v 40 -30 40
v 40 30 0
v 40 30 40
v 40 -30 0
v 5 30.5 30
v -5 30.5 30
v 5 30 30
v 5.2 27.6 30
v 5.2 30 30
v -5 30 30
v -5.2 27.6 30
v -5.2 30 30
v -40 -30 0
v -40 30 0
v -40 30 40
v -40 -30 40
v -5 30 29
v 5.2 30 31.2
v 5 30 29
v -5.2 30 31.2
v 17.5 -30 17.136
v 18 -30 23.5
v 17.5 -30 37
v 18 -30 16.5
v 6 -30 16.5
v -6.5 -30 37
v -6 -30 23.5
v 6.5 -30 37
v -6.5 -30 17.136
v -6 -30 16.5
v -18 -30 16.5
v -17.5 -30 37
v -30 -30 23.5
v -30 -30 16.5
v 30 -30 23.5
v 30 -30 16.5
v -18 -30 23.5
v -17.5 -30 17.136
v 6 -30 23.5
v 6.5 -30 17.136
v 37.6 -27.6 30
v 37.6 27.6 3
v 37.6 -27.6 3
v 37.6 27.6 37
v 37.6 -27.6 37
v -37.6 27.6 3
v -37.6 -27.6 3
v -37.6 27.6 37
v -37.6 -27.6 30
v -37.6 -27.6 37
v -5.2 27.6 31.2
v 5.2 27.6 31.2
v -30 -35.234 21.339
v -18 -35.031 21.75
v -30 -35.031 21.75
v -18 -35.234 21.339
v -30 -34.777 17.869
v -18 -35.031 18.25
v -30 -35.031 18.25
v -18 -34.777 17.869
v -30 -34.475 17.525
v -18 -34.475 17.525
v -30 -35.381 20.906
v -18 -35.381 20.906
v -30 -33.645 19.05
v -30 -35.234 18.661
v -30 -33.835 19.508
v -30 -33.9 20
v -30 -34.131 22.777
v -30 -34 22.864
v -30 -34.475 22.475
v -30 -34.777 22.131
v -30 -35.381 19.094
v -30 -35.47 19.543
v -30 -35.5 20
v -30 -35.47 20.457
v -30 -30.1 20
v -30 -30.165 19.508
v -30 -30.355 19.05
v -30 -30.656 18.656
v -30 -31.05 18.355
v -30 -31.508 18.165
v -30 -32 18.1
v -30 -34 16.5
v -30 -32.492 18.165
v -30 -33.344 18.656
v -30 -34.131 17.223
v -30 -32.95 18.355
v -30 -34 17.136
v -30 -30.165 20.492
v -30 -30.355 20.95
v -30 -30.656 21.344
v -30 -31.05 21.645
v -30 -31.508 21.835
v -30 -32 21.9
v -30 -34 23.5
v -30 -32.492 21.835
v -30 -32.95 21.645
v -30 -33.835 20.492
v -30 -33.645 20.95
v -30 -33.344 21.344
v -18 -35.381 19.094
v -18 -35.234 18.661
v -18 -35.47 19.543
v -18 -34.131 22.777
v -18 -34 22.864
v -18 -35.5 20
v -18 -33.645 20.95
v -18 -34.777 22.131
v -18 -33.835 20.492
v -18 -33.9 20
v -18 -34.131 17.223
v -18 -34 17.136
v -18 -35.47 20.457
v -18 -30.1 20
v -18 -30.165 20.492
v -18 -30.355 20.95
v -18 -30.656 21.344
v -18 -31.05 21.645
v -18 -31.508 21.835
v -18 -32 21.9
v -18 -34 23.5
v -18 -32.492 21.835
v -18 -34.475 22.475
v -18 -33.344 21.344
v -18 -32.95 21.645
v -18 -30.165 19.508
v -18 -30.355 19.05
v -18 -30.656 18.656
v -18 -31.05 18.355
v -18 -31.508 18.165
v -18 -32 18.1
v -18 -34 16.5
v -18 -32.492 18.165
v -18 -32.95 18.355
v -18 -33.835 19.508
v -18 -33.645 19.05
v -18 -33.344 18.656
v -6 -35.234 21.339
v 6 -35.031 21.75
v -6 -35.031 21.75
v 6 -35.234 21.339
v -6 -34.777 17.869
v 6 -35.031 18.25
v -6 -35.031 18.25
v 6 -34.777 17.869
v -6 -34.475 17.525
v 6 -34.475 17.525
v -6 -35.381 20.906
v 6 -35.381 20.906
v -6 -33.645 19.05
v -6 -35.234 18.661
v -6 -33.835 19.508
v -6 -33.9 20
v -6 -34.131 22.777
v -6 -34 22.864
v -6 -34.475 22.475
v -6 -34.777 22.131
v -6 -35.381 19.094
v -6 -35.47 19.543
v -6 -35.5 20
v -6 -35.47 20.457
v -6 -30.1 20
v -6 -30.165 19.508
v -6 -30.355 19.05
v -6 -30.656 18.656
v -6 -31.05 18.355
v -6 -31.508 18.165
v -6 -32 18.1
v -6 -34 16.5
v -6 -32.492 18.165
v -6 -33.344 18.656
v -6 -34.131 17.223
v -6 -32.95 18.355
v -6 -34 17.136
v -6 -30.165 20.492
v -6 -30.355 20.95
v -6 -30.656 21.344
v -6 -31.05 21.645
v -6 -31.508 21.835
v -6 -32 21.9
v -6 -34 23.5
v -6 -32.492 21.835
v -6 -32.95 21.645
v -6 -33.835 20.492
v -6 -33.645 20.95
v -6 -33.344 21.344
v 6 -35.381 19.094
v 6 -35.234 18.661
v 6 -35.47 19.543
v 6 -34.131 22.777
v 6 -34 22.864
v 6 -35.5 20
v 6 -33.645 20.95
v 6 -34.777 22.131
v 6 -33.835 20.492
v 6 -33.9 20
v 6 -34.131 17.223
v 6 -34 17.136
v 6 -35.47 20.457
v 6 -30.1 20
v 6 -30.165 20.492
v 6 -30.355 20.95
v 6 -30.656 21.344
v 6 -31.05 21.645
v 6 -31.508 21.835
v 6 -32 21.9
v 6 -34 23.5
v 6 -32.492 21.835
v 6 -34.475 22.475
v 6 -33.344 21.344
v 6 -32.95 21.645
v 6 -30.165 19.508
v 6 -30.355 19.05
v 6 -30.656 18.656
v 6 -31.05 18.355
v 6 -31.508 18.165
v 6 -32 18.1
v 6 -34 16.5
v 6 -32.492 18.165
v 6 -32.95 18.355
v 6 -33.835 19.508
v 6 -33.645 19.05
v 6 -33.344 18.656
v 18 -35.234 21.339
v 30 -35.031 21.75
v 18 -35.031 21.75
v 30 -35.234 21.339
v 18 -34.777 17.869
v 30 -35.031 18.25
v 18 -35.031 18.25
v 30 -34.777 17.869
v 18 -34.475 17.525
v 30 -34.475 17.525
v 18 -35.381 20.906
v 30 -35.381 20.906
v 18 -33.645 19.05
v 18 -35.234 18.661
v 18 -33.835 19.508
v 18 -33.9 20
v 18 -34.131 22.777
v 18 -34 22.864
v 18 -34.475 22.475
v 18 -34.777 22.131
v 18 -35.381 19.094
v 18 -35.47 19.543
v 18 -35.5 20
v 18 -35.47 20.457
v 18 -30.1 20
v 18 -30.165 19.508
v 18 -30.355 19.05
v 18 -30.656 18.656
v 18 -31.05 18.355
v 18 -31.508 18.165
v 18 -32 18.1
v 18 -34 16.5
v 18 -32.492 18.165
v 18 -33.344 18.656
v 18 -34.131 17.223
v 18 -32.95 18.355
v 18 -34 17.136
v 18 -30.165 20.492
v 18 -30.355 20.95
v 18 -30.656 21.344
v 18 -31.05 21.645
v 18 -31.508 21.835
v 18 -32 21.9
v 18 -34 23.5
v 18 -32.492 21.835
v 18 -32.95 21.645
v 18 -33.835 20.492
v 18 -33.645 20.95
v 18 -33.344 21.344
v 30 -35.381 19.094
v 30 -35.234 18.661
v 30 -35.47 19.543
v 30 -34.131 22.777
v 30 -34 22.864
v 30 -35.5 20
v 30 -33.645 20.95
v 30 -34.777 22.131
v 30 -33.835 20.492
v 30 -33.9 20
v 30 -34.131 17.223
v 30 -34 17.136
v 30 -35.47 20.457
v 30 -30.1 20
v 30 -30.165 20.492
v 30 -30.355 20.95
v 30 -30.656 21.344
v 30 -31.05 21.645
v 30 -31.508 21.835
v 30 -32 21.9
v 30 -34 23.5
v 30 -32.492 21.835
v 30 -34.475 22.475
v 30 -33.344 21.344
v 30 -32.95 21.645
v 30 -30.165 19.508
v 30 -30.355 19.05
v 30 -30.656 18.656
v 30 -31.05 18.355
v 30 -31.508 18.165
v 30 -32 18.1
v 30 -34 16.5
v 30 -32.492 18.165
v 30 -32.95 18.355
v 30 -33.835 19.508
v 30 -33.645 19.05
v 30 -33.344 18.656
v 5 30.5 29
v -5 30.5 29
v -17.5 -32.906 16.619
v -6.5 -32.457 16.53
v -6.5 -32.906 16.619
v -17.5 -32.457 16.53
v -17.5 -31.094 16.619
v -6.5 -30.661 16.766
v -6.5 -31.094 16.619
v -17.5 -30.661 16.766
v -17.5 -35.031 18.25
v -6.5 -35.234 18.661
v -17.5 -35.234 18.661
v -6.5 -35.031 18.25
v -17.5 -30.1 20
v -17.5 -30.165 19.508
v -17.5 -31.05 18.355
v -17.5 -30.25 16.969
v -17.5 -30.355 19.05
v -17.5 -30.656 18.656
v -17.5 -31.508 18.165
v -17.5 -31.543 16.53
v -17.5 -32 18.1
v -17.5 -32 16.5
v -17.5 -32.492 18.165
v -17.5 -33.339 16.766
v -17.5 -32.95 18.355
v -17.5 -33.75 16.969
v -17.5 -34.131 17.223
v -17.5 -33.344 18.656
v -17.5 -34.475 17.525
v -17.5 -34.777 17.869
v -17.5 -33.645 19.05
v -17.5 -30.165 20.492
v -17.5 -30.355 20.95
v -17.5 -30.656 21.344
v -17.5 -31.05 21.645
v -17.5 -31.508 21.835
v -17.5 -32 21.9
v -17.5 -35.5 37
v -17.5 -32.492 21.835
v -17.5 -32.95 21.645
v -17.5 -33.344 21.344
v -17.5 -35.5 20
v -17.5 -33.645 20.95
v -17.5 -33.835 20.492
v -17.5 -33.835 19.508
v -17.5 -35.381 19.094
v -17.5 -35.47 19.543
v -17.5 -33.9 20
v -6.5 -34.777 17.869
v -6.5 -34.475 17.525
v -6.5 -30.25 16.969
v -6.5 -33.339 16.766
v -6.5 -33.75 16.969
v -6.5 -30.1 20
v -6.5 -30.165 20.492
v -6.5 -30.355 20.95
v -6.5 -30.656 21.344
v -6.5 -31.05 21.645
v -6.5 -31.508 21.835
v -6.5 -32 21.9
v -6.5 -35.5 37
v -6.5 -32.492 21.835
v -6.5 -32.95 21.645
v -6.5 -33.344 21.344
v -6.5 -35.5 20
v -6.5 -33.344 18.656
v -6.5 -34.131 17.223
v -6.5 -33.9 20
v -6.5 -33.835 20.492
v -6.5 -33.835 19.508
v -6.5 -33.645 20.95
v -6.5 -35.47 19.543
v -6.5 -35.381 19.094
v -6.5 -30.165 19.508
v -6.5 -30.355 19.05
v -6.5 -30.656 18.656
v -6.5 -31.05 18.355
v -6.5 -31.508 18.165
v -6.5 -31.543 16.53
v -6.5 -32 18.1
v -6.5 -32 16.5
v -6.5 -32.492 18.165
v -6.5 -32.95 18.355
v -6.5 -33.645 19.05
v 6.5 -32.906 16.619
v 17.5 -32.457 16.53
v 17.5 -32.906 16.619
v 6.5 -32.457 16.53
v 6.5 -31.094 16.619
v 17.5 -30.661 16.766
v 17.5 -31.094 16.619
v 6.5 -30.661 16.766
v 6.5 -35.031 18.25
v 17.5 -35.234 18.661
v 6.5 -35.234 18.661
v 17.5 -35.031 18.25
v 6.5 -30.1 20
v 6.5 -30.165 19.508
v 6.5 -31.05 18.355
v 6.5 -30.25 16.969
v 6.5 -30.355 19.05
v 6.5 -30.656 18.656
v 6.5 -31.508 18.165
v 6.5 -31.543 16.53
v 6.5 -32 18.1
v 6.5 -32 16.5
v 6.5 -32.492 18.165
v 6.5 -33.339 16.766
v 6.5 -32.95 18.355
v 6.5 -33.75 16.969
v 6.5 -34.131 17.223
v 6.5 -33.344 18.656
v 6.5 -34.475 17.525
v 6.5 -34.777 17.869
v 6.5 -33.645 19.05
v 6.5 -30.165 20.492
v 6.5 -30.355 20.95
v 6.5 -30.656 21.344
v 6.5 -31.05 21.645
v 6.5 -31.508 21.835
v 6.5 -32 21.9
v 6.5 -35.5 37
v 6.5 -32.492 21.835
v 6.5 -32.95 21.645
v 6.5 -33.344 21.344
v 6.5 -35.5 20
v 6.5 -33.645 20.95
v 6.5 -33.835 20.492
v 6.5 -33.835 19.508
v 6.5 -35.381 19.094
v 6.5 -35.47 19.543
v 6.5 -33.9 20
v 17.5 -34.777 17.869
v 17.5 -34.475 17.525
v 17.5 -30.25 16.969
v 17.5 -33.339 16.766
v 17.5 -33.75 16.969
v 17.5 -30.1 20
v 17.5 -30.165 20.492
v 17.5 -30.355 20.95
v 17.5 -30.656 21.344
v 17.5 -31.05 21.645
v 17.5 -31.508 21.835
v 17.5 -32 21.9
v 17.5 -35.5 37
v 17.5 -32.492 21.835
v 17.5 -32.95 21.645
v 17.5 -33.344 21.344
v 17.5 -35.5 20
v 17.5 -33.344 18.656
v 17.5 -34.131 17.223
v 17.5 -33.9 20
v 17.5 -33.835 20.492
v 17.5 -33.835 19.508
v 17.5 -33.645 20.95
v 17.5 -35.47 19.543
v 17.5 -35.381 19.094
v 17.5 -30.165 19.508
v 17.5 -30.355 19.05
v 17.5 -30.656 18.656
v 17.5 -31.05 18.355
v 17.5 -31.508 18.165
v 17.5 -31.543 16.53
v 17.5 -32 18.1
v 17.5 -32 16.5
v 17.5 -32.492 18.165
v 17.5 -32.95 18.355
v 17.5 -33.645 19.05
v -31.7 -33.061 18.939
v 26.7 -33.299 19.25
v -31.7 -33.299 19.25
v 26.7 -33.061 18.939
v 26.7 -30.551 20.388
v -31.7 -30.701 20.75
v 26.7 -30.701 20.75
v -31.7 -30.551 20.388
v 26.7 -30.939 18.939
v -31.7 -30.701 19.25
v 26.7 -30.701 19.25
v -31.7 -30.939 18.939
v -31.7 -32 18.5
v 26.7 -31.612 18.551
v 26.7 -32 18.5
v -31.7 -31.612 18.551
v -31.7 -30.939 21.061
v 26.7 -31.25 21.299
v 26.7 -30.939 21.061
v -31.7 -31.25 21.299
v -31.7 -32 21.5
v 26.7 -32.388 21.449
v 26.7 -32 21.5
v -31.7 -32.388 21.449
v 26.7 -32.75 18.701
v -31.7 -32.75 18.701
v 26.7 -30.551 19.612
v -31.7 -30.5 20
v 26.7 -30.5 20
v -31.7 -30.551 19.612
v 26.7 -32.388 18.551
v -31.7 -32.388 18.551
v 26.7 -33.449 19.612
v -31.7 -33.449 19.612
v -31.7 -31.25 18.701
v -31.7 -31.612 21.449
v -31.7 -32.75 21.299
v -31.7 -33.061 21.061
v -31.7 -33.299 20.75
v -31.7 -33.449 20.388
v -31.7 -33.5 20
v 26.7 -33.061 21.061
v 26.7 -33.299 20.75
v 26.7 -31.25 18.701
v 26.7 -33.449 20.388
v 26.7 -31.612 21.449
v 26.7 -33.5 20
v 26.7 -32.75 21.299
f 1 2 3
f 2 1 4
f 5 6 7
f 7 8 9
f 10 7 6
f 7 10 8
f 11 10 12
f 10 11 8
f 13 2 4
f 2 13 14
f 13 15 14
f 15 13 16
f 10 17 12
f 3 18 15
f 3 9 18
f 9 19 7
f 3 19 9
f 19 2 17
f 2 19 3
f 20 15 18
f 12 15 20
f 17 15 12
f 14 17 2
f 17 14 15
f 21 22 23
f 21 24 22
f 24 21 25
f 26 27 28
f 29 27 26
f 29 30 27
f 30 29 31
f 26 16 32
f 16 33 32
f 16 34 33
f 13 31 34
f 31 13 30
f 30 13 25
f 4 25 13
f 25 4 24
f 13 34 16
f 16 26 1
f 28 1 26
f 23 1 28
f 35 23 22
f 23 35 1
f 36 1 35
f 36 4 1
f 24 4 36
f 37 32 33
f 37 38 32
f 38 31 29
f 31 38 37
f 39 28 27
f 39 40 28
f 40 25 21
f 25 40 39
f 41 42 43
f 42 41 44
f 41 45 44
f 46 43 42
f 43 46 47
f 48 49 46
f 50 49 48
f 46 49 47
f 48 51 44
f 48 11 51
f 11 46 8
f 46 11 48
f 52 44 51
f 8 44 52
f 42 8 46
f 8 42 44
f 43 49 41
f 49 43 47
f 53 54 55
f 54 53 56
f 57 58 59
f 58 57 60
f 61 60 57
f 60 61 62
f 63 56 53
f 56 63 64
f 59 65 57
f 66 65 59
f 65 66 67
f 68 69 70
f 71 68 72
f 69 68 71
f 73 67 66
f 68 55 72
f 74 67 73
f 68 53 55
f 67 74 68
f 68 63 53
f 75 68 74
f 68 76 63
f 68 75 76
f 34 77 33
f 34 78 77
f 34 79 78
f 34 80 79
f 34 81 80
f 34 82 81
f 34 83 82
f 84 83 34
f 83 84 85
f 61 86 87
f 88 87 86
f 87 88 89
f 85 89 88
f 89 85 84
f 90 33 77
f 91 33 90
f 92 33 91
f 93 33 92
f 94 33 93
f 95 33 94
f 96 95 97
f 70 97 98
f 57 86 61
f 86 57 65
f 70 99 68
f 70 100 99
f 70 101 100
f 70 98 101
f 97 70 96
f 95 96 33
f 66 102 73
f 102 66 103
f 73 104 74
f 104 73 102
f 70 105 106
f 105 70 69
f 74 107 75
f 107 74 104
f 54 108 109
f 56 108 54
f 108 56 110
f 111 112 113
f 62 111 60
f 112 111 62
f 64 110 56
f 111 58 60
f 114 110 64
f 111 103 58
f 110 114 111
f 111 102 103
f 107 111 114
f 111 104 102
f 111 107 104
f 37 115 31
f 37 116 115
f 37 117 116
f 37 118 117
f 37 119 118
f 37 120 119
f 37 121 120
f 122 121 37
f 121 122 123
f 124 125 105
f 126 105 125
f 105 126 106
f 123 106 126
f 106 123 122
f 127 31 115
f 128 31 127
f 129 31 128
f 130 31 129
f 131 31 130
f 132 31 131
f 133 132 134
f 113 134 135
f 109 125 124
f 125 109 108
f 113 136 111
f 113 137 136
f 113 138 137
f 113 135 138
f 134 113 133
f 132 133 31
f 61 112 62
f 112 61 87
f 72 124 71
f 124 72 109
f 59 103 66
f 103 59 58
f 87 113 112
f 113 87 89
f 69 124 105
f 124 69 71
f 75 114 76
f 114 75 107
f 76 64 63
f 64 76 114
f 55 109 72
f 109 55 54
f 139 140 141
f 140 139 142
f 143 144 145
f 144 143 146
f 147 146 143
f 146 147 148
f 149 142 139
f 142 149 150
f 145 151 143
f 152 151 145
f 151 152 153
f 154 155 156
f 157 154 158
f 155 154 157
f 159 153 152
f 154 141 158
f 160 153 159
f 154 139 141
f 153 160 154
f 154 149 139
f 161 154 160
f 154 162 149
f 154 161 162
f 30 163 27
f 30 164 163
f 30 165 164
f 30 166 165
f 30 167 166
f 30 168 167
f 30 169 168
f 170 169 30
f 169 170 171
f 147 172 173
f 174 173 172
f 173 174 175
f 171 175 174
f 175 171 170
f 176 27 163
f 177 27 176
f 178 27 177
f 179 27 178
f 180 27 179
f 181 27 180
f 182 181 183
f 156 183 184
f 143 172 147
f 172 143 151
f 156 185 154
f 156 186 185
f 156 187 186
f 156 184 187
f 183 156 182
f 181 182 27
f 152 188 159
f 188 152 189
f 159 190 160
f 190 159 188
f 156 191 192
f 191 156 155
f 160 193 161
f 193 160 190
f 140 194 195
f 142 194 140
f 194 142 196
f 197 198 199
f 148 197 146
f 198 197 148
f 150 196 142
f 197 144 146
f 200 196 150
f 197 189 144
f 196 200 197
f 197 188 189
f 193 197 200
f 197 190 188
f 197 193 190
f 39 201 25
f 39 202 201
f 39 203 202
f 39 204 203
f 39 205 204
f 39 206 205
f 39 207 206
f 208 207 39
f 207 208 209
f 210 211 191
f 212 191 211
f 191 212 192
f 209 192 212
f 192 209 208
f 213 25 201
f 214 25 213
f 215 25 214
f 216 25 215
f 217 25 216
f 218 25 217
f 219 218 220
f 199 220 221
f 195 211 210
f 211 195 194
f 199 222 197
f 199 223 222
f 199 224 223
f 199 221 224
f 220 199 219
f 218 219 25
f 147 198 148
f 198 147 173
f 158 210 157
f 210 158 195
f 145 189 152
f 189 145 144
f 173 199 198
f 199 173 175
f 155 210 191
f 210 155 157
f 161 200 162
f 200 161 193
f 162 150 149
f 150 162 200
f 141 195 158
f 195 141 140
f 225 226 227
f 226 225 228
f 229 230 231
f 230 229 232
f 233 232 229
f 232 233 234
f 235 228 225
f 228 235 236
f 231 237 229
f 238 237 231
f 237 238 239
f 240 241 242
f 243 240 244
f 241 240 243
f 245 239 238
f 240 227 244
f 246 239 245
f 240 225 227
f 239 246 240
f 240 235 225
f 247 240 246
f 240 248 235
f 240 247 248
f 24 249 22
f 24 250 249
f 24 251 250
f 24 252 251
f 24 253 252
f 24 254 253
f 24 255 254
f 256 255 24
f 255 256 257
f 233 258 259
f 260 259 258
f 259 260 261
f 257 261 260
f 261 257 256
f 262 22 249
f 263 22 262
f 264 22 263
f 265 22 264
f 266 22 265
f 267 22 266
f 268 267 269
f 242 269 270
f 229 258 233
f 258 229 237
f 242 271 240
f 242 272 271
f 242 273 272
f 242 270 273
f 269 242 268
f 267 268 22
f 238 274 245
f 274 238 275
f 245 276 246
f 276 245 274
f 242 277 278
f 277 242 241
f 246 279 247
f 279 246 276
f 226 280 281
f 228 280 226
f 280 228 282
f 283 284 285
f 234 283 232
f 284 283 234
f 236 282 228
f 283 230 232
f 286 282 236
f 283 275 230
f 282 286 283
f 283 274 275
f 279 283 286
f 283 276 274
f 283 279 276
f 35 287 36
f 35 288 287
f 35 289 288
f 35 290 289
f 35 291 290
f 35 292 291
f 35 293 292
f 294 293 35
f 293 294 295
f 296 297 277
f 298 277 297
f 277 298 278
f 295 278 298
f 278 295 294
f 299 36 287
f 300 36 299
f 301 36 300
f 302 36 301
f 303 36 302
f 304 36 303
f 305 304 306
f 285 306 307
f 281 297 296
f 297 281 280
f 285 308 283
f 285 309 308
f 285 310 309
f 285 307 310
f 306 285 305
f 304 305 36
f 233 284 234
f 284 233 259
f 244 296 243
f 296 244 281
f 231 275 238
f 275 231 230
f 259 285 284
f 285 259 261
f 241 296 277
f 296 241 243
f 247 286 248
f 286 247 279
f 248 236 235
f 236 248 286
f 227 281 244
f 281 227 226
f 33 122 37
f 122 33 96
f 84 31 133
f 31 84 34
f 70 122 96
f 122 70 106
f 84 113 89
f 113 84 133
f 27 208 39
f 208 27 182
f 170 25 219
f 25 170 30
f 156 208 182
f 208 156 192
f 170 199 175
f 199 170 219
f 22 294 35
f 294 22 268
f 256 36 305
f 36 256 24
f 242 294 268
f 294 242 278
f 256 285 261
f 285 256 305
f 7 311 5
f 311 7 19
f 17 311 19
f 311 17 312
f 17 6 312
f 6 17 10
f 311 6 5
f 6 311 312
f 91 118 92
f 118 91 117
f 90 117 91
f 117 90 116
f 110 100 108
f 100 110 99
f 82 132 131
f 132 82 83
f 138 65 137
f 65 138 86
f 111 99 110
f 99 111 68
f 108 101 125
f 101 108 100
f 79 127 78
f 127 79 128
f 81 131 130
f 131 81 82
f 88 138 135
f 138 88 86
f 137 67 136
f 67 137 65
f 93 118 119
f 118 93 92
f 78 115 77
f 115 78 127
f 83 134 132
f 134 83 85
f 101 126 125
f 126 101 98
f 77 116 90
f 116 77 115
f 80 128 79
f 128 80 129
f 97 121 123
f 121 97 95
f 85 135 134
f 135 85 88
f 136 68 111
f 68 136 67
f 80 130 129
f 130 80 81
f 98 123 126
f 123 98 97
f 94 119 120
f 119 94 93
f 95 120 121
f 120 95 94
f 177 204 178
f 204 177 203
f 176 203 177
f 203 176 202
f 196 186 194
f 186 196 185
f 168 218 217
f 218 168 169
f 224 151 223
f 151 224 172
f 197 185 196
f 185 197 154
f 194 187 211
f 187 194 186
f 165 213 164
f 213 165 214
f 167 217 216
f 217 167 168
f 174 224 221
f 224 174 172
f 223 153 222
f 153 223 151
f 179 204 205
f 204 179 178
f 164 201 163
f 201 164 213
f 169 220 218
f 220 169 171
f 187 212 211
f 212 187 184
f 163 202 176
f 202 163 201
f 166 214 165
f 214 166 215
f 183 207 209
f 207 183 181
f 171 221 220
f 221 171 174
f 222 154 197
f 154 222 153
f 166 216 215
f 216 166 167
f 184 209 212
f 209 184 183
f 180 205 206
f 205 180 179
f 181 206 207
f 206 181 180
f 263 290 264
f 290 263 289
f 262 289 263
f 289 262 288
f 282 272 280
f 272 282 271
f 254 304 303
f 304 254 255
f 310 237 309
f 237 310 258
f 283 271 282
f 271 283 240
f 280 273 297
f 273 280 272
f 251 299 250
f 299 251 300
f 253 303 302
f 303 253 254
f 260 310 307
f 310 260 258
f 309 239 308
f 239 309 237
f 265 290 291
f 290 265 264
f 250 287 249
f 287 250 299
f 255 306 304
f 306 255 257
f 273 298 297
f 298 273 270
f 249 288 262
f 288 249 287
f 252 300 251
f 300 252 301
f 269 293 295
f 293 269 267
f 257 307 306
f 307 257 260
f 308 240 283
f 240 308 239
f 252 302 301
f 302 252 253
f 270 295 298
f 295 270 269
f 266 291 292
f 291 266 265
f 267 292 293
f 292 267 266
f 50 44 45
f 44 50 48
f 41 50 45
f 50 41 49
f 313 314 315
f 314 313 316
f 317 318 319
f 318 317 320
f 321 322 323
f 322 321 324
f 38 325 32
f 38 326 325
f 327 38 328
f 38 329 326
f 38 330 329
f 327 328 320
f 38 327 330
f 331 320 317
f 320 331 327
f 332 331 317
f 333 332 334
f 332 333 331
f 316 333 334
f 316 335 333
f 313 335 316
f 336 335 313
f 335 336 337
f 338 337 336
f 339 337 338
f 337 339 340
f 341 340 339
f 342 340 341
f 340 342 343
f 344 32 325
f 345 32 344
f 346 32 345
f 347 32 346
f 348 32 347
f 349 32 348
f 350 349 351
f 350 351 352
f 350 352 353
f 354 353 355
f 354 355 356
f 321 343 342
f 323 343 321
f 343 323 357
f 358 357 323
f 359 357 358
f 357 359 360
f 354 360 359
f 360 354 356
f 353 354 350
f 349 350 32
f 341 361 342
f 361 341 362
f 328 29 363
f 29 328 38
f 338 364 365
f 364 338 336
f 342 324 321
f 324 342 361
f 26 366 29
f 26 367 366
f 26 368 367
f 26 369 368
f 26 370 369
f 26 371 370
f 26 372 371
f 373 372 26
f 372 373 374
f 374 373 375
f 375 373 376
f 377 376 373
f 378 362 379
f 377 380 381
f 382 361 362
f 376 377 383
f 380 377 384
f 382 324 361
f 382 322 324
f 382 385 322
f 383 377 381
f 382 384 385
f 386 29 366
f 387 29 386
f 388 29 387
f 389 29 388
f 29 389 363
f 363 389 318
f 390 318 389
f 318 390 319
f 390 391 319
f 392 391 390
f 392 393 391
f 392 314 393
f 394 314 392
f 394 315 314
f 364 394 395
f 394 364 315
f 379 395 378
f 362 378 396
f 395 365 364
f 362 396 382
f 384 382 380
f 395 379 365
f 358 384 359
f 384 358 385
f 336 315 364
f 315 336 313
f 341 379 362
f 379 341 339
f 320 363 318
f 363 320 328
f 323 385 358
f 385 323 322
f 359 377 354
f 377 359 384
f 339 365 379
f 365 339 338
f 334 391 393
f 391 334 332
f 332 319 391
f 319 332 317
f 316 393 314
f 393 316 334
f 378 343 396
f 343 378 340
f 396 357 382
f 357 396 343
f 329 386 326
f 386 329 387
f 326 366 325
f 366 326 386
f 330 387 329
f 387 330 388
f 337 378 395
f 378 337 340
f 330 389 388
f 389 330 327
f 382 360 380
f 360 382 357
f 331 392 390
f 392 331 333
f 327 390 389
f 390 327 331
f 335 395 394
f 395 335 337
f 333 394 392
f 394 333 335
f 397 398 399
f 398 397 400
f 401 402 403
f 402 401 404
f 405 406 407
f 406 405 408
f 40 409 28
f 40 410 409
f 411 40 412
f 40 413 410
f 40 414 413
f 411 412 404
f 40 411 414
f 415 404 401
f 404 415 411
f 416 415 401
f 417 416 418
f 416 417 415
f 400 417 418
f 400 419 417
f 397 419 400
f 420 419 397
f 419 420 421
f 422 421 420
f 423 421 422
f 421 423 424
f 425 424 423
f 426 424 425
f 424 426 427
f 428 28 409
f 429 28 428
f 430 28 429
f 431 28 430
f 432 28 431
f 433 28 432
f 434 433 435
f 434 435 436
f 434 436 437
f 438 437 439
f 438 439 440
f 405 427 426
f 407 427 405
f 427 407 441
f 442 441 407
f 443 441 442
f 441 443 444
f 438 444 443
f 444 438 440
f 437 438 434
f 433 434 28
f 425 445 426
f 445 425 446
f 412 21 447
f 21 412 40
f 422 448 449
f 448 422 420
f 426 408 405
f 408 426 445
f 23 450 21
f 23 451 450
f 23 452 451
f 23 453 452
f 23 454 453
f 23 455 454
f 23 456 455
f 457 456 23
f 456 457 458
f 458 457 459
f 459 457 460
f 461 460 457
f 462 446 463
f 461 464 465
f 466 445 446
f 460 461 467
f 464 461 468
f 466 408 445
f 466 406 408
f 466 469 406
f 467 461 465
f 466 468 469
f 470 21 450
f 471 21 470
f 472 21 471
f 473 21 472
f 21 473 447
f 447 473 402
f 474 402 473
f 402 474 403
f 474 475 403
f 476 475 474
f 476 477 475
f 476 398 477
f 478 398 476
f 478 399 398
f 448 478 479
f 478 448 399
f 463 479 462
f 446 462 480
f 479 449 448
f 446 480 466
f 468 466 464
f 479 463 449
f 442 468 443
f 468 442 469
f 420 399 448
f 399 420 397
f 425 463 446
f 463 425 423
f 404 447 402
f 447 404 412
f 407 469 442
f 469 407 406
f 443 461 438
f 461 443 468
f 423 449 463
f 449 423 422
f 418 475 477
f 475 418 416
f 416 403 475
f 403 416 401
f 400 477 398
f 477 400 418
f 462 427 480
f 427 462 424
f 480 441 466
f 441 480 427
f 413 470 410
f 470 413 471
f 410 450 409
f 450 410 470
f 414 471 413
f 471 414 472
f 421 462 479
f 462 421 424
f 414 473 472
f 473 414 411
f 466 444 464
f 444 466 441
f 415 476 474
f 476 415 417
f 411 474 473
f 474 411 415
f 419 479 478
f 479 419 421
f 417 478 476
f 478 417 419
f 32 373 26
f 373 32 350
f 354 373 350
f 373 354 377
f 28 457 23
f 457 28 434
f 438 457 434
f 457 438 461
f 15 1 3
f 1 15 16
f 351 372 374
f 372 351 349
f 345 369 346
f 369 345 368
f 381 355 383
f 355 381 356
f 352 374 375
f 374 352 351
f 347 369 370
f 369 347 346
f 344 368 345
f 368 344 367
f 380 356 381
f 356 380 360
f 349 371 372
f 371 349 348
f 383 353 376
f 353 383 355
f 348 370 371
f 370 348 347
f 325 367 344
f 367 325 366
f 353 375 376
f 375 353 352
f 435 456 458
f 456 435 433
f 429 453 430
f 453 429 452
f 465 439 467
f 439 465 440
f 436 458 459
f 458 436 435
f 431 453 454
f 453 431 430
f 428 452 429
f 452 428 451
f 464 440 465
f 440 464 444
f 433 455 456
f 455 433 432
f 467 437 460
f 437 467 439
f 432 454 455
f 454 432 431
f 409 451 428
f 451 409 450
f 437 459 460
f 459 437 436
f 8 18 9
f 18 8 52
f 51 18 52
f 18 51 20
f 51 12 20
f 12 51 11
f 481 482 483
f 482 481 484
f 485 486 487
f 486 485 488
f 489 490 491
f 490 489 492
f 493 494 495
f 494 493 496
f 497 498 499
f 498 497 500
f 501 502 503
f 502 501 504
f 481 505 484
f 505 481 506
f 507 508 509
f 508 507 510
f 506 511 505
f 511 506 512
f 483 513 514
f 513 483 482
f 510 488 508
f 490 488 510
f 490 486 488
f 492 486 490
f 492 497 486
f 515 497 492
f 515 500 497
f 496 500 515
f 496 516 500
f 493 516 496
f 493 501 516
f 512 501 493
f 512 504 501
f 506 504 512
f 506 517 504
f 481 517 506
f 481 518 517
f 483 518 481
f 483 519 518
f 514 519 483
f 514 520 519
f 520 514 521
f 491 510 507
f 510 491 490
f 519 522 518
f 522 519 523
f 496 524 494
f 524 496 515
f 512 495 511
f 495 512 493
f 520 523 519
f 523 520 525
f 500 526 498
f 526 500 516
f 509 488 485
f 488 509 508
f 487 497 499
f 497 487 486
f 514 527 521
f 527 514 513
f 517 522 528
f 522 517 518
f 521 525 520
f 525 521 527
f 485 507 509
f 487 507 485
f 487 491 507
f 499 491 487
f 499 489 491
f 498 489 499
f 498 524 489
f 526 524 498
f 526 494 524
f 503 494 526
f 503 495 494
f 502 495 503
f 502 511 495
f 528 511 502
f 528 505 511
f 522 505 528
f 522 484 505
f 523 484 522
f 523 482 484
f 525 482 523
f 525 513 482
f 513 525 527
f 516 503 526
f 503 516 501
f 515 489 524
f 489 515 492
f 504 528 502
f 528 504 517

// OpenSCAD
part = "assembly"; // [base, lid, pin, assembly]
cadverify_only = "";
module instance(name, part, unit = 1) {
  echo(cadverify_instance = [name, part, unit]);
  if (cadverify_only == "" || cadverify_only == name) children();
}
Bx=80; By=60; Hb=30; Lt=3; Sk=7; Wt=2.4; Bt=3;
Ya=-32; Za=20; Kr=3.5; Br=1.9; Pr=1.5;
module barrel(x0,x1) {
  difference() {
    translate([0,Ya,Za]) rotate([0,90,0]) translate([0,0,(x0+x1)/2])
      cylinder(h=x1-x0, r=Kr, center=true, $fn=48);
    translate([0,Ya,Za]) rotate([0,90,0]) translate([0,0,(x0+x1)/2])
      cylinder(h=(x1-x0)+0.8, r=Br, center=true, $fn=24);
  }
}
module base_geom() {
  difference() {
    union() {
      difference() {
        translate([-40,-30,0]) cube([80,60,30]);
        translate([-37.6,-27.6,3]) cube([75.2,55.2,27.01]);
      }
      for (b=[[-30,-18],[-6,6],[18,30]]) {
        translate([b[0],-34,16.5]) cube([b[1]-b[0],5.5,7.0]);
        barrel(b[0],b[1]);
      }
      translate([-5,29.0,29.0]) cube([10,1.5,1.0]);
    }
    for (b=[[-30,-18],[-6,6],[18,30]])
      translate([0,Ya,Za]) rotate([0,90,0]) translate([0,0,(b[0]+b[1])/2])
        cylinder(h=(b[1]-b[0])+0.8, r=Br, center=true, $fn=24);
  }
}
module lid_open() {
  difference() {
    union() {
      translate([-40,-94,0]) cube([80,60,3]);
      difference() {
        translate([-40,-94,3]) cube([80,60,7]);
        translate([-37.6,-91.6,3]) cube([75.2,55.2,7.01]);
      }
      for (b=[[-17.5,-6.5],[6.5,17.5]]) {
        translate([b[0],-34,3]) cube([b[1]-b[0],5.5,17.0]);
        barrel(b[0],b[1]);
      }
    }
    translate([-5.2,-94.1,8.8]) cube([10.4,2.6,1.3]);
    for (b=[[-17.5,-6.5],[6.5,17.5]])
      translate([0,Ya,Za]) rotate([0,90,0]) translate([0,0,(b[0]+b[1])/2])
        cylinder(h=(b[1]-b[0])+0.8, r=Br, center=true, $fn=24);
  }
}
module pin_vert() {
  translate([0,0,0.8]) cylinder(h=58.4, r=Pr, center=false, $fn=24);
}
module lid_closed() {
  translate([0,Ya,Za]) rotate([180,0,0]) translate([0,-Ya,-Za]) lid_open();
}
module pin_placed() {
  translate([0,Ya,Za]) rotate([0,90,0]) translate([0,0,-32.5]) pin_vert();
}
if (part=="base") {
  base_geom();
  echo(cadverify_spec=[
    ["bounds", [[-40,-35.5,0],[40,30,30]]],
    ["bodies", 1],
    ["support_faces", [["base","-z",4000]]],
    ["overhangs_allowed", [["hinge", [[-30,-35.5,14],[30,-28.5,24]]]]],
    ["copies", 1],
    ["details", [
      ["bottom","thickness",[0,0,-1],[0,0,1],3],
      ["cavity","void",[[-37.6,-27.6,3],[37.6,27.6,30]],0.9],
      ["knuckle","material",[[-30,-35.5,16.5],[-18,-28.5,23.5]],0.5],
      ["bore","hole",[-31,-32,20],[1,0,0],[[0,3.8],[12,3.8]]],
      ["catch","material",[[-5,29,29],[5,30.5,30]],0.8]
    ]]
  ]);
} else if (part=="lid") {
  lid_open();
  echo(cadverify_spec=[
    ["bounds", [[-40,-94,0],[40,-28.5,23.5]]],
    ["bodies", 1],
    ["support_faces", [["lid","-z",4000]]],
    ["overhangs_allowed", [["hinge", [[-17.5,-35.5,14],[17.5,-28.5,24]]]]],
    ["copies", 1],
    ["details", [
      ["plate","thickness",[0,-64,-1],[0,0,1],3],
      ["pocket","void",[[-37.6,-91.6,3],[37.6,-36.4,10]],0.9],
      ["knuckle","material",[[-17.5,-35.5,16.5],[-6.5,-28.5,23.5]],0.5],
      ["bore","hole",[-18,-32,20],[1,0,0],[[0,3.8],[11,3.8]]],
      ["notch","void",[[-5.2,-94.1,8.8],[5.2,-91.5,10.1]],0.9]
    ]]
  ]);
} else if (part=="pin") {
  pin_vert();
  echo(cadverify_spec=[
    ["bounds", [[-3,-3,0.8],[3,3,59.2]]],
    ["bodies", 1],
    ["support_faces", [["pin","-z",5]]],
    ["overhangs_allowed", []],
    ["copies", 1],
    ["details", [
      ["shaft","thickness",[5,0,32],[-1,0,0],3]
    ]]
  ]);
} else {
  instance("base","base") base_geom();
  instance("lid","lid") lid_closed();
  instance("pin","pin") pin_placed();
  echo(cadverify_spec=[
    ["bounds", [[-40,-35.5,0],[40,30.5,40]]],
    ["support_faces", [["bed","-z",4000]]],
    ["motions", [["swing",["lid"],"rotate",[0,-32,20],[1,0,0],[0,180]]]],
    ["assembly_order", [[["base"],[0,0,0]],[["lid"],[0,0,1]],[["pin"],[-1,0,0]]]],
    ["print_in_place", 0.4],
    ["print_pose", [["swing",180]]],
    ["overhangs_allowed", [["hinge", [[-30,-35.5,14],[30,-28.5,24]]]]]
  ]);
}
